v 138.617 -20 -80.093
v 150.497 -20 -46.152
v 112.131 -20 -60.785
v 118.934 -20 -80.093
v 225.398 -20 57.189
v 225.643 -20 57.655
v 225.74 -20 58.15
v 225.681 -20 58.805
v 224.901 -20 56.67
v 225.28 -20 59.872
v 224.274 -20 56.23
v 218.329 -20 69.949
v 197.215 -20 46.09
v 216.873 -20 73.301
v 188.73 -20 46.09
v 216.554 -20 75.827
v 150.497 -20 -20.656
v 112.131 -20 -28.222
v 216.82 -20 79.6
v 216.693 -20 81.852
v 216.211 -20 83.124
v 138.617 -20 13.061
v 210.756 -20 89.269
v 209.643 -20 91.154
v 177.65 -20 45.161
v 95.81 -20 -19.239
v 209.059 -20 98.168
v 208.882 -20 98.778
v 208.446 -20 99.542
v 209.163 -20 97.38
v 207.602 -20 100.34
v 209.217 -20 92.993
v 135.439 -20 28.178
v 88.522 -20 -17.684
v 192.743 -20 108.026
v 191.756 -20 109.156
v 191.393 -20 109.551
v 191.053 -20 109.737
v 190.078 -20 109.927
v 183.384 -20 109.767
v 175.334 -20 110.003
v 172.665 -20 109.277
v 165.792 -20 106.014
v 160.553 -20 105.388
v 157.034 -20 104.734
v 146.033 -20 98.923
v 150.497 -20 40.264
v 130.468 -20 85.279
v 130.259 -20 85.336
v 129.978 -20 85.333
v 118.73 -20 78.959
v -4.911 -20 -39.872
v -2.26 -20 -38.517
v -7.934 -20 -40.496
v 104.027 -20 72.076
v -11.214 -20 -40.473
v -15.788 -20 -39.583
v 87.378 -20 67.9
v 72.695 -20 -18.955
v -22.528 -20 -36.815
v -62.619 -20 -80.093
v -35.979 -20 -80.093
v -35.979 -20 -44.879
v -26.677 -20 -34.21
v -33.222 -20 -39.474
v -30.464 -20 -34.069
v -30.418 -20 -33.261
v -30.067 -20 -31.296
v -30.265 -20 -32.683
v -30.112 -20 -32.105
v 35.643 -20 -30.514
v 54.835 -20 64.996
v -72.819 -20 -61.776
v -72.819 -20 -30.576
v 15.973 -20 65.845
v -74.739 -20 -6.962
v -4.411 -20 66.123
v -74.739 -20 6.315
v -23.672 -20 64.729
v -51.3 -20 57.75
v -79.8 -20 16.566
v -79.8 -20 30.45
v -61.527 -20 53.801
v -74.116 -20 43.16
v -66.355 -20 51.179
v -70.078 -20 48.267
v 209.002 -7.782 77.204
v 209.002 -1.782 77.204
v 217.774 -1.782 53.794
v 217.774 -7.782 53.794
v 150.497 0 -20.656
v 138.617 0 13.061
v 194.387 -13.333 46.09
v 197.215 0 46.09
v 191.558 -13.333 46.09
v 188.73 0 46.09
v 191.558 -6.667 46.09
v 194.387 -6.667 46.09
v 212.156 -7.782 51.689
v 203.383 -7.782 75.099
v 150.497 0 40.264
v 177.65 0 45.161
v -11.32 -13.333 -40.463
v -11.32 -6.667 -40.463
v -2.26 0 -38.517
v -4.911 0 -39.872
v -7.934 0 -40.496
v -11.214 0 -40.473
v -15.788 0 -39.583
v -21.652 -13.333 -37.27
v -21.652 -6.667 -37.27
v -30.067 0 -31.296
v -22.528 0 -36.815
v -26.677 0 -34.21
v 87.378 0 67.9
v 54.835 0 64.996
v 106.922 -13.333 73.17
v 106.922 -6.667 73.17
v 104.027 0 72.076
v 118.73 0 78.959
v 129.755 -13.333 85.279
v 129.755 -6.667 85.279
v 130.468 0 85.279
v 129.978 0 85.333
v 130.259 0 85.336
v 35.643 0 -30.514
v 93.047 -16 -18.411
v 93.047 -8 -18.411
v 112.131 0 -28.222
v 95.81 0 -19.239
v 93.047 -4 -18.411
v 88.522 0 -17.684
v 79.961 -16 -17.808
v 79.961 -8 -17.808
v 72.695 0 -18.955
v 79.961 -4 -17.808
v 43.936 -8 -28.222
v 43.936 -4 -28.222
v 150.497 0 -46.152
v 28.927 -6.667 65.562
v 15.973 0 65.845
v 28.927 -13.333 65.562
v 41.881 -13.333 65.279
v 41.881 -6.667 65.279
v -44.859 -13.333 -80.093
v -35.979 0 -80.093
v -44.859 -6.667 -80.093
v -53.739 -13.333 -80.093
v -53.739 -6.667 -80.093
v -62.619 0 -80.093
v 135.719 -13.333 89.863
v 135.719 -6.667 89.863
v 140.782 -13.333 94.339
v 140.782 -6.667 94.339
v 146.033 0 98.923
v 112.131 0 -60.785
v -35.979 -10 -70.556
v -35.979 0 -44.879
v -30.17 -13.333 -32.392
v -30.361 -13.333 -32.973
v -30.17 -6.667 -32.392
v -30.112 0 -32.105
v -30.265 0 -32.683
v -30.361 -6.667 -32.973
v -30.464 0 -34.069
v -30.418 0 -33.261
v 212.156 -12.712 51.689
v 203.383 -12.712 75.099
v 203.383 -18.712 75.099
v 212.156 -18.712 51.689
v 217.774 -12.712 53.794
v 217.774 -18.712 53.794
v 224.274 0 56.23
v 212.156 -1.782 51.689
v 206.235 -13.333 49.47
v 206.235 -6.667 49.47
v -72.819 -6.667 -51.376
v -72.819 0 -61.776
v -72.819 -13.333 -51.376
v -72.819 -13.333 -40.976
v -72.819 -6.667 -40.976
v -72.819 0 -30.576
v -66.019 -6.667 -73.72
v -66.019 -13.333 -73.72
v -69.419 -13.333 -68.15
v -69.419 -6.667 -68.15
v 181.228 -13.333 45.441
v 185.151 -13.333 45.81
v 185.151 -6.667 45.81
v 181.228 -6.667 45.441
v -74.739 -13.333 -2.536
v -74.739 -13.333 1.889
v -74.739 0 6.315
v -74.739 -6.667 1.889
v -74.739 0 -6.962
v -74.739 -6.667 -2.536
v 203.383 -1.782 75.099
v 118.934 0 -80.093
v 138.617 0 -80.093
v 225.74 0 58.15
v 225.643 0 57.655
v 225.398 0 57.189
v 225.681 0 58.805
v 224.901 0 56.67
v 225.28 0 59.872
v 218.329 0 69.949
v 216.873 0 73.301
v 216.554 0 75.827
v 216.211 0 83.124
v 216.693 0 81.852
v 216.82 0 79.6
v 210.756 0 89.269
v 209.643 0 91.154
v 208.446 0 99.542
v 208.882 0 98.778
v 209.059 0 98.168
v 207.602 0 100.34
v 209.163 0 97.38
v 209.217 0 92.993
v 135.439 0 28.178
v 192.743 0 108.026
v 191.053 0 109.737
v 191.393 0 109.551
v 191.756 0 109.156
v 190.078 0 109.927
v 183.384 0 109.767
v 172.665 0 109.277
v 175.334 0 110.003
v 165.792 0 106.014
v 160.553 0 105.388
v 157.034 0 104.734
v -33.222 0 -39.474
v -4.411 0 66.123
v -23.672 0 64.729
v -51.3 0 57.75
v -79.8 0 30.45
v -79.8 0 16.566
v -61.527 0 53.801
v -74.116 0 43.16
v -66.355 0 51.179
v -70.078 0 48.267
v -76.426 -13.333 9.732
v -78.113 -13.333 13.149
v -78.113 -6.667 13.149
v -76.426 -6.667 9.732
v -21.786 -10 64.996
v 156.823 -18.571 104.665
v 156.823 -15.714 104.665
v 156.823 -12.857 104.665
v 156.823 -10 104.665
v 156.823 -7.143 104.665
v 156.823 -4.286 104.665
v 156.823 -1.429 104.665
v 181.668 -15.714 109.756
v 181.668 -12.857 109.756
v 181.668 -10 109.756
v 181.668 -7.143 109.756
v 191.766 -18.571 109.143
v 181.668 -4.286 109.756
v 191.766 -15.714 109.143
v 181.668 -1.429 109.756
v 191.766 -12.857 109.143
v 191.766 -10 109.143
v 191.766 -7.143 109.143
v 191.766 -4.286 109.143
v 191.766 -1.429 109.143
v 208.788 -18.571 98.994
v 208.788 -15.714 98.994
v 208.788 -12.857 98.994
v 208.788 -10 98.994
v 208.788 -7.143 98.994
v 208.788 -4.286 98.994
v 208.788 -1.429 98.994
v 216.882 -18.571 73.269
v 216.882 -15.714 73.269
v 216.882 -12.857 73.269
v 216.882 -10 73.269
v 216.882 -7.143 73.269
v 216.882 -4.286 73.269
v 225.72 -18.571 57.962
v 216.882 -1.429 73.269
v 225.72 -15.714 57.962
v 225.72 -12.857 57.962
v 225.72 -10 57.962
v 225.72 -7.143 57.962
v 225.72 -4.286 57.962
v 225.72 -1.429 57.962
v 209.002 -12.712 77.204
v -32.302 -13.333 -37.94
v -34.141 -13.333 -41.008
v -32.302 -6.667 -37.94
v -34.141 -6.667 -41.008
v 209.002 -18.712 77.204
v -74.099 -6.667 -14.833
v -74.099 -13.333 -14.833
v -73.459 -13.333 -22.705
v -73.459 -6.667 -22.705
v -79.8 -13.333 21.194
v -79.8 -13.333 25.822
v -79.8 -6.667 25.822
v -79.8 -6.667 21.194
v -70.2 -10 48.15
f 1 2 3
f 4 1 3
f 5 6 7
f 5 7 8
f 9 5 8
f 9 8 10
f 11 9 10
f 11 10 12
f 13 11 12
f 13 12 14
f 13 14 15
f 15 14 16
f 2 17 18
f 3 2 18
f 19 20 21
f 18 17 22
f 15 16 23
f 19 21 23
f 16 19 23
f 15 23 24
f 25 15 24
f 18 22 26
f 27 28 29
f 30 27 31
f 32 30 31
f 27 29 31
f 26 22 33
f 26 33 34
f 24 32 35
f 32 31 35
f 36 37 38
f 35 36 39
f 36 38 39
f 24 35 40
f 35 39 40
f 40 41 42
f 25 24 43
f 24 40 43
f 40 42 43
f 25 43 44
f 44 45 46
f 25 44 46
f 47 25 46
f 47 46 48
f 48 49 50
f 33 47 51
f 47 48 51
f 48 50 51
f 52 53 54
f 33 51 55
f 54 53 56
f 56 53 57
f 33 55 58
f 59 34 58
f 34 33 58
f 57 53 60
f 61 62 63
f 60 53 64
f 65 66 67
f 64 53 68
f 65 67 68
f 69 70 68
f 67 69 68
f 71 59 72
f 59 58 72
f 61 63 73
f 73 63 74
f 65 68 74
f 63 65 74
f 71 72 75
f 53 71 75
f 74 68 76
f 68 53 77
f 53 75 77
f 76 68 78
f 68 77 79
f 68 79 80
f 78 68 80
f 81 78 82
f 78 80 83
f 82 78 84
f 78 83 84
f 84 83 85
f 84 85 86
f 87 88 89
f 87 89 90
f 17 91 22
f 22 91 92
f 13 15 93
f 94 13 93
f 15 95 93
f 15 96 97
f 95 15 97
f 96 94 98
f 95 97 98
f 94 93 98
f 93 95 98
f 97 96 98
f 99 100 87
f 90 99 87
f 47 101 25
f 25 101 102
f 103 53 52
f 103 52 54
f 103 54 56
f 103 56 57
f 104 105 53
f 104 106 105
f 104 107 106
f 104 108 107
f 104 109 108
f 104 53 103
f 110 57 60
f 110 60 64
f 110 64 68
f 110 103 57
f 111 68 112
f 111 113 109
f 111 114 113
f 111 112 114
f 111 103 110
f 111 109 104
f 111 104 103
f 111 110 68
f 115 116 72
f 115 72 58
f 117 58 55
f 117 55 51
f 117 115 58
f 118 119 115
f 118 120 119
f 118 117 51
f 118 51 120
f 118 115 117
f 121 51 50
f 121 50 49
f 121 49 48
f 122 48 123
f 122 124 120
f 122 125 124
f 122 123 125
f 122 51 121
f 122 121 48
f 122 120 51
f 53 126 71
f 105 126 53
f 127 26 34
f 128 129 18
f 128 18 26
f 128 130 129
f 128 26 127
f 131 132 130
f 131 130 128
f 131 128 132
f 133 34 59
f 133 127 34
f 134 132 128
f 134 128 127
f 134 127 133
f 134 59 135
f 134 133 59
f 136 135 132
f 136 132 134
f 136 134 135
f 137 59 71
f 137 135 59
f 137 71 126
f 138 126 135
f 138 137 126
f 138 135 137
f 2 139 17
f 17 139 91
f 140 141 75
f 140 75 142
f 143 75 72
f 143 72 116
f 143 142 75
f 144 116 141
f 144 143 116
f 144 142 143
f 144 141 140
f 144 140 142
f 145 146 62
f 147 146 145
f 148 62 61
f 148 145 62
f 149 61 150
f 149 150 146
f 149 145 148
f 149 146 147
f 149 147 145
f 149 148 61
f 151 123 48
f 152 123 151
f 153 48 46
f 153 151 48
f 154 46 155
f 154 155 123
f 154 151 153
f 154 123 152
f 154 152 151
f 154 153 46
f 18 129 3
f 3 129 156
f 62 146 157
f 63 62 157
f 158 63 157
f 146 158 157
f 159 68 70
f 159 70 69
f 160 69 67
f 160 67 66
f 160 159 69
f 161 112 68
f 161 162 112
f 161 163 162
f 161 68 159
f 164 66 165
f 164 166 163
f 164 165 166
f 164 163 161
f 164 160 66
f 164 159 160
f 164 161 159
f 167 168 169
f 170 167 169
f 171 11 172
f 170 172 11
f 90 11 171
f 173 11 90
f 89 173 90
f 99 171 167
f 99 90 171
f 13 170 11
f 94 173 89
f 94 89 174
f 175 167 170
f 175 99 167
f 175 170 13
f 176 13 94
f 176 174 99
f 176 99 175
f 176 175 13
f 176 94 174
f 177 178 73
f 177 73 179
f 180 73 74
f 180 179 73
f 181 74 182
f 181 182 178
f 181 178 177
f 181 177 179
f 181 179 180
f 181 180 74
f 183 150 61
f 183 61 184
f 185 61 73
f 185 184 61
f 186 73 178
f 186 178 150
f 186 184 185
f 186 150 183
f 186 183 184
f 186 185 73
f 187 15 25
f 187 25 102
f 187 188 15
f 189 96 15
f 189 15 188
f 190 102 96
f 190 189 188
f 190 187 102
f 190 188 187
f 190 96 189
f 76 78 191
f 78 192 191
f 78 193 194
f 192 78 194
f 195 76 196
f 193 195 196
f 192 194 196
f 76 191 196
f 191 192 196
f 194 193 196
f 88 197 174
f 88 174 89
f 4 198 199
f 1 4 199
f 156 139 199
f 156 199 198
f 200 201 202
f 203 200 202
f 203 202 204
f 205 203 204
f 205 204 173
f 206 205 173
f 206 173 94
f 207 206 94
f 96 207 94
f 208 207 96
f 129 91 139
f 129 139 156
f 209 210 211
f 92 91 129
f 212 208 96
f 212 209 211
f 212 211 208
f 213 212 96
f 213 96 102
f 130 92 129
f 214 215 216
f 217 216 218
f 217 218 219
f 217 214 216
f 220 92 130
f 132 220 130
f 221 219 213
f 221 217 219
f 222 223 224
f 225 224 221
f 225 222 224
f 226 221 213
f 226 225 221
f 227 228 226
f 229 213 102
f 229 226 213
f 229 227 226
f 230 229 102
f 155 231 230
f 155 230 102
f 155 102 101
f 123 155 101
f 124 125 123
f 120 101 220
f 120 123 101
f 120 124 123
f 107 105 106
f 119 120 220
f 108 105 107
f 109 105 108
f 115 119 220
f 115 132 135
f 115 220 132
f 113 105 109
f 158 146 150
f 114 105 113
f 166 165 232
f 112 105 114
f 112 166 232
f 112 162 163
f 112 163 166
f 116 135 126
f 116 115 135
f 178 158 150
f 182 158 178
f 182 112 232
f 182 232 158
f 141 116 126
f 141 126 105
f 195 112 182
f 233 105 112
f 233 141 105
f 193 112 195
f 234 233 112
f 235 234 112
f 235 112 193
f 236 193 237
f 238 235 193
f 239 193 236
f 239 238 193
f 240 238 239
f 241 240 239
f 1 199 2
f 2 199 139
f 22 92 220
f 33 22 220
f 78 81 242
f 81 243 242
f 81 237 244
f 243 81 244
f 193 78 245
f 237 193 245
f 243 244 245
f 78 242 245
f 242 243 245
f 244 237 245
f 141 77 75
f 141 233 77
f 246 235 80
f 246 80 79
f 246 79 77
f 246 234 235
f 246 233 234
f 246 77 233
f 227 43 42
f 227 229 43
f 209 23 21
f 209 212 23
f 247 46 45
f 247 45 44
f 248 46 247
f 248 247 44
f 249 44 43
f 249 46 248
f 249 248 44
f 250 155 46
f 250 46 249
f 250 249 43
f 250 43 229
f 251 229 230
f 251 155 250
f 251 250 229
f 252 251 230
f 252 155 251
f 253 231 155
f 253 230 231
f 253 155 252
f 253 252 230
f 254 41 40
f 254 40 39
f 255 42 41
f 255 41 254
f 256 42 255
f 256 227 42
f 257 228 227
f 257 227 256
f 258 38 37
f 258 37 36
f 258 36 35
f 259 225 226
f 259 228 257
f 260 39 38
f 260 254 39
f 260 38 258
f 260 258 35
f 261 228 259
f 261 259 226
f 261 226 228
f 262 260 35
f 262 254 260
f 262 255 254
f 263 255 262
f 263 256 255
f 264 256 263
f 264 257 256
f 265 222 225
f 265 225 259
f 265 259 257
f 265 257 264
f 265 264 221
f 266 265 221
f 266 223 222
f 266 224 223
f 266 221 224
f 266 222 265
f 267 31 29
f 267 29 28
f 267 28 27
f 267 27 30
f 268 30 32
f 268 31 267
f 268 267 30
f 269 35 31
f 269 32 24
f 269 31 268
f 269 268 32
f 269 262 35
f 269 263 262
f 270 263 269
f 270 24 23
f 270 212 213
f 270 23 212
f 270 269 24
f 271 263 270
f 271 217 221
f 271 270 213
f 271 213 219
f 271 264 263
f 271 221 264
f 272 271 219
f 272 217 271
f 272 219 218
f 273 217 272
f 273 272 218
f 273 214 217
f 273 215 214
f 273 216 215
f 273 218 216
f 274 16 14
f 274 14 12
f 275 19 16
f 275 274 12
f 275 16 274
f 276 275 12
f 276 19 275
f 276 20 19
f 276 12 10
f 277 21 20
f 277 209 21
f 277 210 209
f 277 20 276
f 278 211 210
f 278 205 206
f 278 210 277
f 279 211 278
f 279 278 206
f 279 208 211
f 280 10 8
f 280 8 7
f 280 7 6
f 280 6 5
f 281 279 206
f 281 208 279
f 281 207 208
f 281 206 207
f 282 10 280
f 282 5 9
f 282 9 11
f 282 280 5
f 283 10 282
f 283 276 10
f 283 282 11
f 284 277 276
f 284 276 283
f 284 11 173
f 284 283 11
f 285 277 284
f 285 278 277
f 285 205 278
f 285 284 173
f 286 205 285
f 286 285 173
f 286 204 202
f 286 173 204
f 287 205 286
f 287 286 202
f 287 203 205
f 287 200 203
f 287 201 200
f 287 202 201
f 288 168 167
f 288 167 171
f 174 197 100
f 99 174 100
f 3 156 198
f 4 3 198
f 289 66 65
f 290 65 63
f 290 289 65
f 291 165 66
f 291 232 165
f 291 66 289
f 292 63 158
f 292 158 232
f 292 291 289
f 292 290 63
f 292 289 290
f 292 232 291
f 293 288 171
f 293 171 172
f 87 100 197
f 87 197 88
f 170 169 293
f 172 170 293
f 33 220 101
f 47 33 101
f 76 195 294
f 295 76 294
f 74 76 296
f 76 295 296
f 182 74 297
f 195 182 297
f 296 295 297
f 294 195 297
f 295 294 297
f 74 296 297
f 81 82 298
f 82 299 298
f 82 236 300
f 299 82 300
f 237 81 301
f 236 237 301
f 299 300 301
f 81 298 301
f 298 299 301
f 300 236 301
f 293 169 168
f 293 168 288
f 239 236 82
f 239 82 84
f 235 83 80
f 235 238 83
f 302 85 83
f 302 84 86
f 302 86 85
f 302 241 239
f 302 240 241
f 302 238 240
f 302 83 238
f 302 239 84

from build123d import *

# Parameters (mm, degrees)
F1_DEPTH = 20
F2_W     = 6
F2_H     = 6
F3_DEPTH = 25


with BuildPart() as f1:
    # F0 (on Front) → F1 (new body)
    with BuildSketch(Plane.XZ):
        with BuildLine():
            add(Edge.make_bspline(
                [(-79.8000022769, 30.4499994963), (-77.3255732356, 37.0363681068), (-72.3122665902, 50.380652777), (-58.3638603742, 55.2725916691), (-51.3000003994, 57.750005275)],
                knots=[0, 0, 0, 0, 0.4935722501, 1, 1, 1, 1], degree=3))
            add(Edge.make_bspline(
                [(-79.8000022769, 30.4499994963), (-79.8000022769, 25.8219769845), (-79.8000022769, 21.1939544727), (-79.8000022769, 16.5659319609)],
                knots=[0, 0, 0, 0, 13.8840675354, 13.8840675354, 13.8840675354, 13.8840675354], degree=3))
            add(Edge.make_bspline(
                [(-79.8000022769, 16.5659319609), (-78.1129176418, 13.1488006252), (-76.4258330067, 9.7316692894), (-74.7387483716, 6.3145379536)],
                knots=[0, 0, 0, 0, 11.4327324025, 11.4327324025, 11.4327324025, 11.4327324025], degree=3))
            add(Edge.make_bspline(
                [(-74.7387483716, 6.3145379536), (-74.7387483716, 1.8891720101), (-74.7387483716, -2.5361939333), (-74.7387483716, -6.9615598768)],
                knots=[0, 0, 0, 0, 13.2760978304, 13.2760978304, 13.2760978304, 13.2760978304], degree=3))
            add(Edge.make_bspline(
                [(-74.7387483716, -6.9615598768), (-74.0988701582, -14.8331653327), (-73.4589919448, -22.7047707886), (-72.8191137314, -30.5763762444)],
                knots=[0, 0, 0, 0, 23.6927108881, 23.6927108881, 23.6927108881, 23.6927108881], degree=3))
            add(Edge.make_bspline(
                [(-72.8191137314, -61.776380986), (-72.8191137314, -51.3763794055), (-72.8191137314, -40.9763778249), (-72.8191137314, -30.5763762444)],
                knots=[0, 0, 0, 0, 31.2000047415, 31.2000047415, 31.2000047415, 31.2000047415], degree=3))
            add(Edge.make_bspline(
                [(-62.619112432, -80.093100667), (-66.0191128651, -72.7824432154), (-69.4191132983, -69.0870384375), (-72.8191137314, -61.776380986)],
                knots=[0, 0, 0, 0, 20.9652628503, 20.9652628503, 20.9652628503, 20.9652628503], degree=3))
            add(Edge.make_bspline(
                [(-35.9794348478, -80.093100667), (-44.8593273759, -80.093100667), (-53.7392199039, -80.093100667), (-62.619112432, -80.093100667)],
                knots=[0, 0, 0, 0, 26.6396775842, 26.6396775842, 26.6396775842, 26.6396775842], degree=3))
            add(Edge.make_bspline(
                [(-35.9794348478, -70.5561637878), (-35.9794348478, -74.9402269721), (-35.9794348478, -75.7090374827), (-35.9794348478, -80.093100667)],
                knots=[0, 0, 0, 0, 9.5369368792, 9.5369368792, 9.5369368792, 9.5369368792], degree=3))
            add(Edge.make_bspline(
                [(-35.9794348478, -70.5561637878), (-35.9794348478, -68.7853942315), (-35.9794348478, -67.0146246751), (-35.9794348478, -65.2438551188)],
                knots=[0, 0, 0, 0, 5.3123086691, 5.3123086691, 5.3123086691, 5.3123086691], degree=3))
            add(Edge.make_bspline(
                [(-35.9794348478, -44.8791794479), (-35.9794348478, -51.6674046715), (-35.9794348478, -58.4556298951), (-35.9794348478, -65.2438551188)],
                knots=[0, 0, 0, 0, 20.3646756709, 20.3646756709, 20.3646756709, 20.3646756709], degree=3))
            add(Edge.make_bspline(
                [(-30.4639991373, -34.0694524348), (-32.3024777075, -38.877778997), (-34.1409562776, -40.0708528856), (-35.9794348478, -44.8791794479)],
                knots=[0, 0, 0, 0, 12.1354945995, 12.1354945995, 12.1354945995, 12.1354945995], degree=3))
            add(Edge.make_bspline(
                [(-30.0665453109, -31.2956437094), (-30.0665453109, -32.9927003257), (-30.4639991373, -32.3723958184), (-30.4639991373, -34.0694524348)],
                knots=[0, 0, 0, 0, 2.8021392523, 2.8021392523, 2.8021392523, 2.8021392523], degree=3))
            add(Edge.make_bspline(
                [(-2.2595758461, -38.5172505659), (-9.6200771127, -43.818919345), (-23.6749724779, -37.8736013329), (-30.0665453109, -31.2956437094)],
                knots=[0, 0, 0, 0, 28.7294127404, 28.7294127404, 28.7294127404, 28.7294127404], degree=3))
            add(Edge.make_bspline(
                [(112.1307405169, -28.2221909259), (105.8817951046, -24.7501724659), (93.9445246715, -15.0327857291), (65.6693160397, -19.5559154849), (44.3976752626, -28.9456919948), (21.6065692925, -33.5118881504), (6.2228508317, -37.1349119471), (-2.2595758461, -38.5172505659)],
                knots=[0, 0, 0, 0, 0.1898170247, 0.4016605517, 0.601369808, 0.7966678874, 1, 1, 1, 1], degree=3))
            Line((112.1307405169, -28.2221909259), (112.1307405169, -60.7847019593))
            Line((112.1307405169, -60.7847019593), (118.9336627722, -80.093100667))
            Line((118.9336627722, -80.093100667), (138.6172473431, -80.093100667))
            Line((138.6172473431, -80.093100667), (150.4966318607, -46.1519733071))
            Line((150.4966318607, -46.1519733071), (150.4966318607, -20.6556878984))
            Line((150.4966318607, -20.6556878984), (138.6172473431, 13.0609832704))
            Line((138.6172473431, 13.0609832704), (135.4389489575, 28.1778269822))
            Line((135.4389489575, 28.1778269822), (150.4966318607, 40.2639172971))
            Line((150.4966318607, 40.2639172971), (177.6495277882, 45.1609827578))
            add(Edge.make_bspline(
                [(188.7300014496, 46.0898764431), (185.5520208677, 45.9128059447), (180.8275083701, 45.3380532563), (177.6495277882, 45.1609827578)],
                knots=[0, 0, 0, 0, 11.1193408096, 11.1193408096, 11.1193408096, 11.1193408096], degree=3))
            add(Edge.make_bspline(
                [(188.7300014496, 46.0898764431), (191.5584305922, 46.0898764431), (194.3868597349, 46.0898764431), (197.2152888775, 46.0898764431)],
                knots=[0, 0, 0, 0, 8.4852874279, 8.4852874279, 8.4852874279, 8.4852874279], degree=3))
            add(Edge.make_bspline(
                [(224.2738649775, 56.229789657), (215.2543396108, 52.8498185857), (206.2348142442, 49.4698475144), (197.2152888775, 46.0898764431)],
                knots=[0.0497350992, 0.0497350992, 0.0497350992, 0.0497350992, 28.9458313848, 28.9458313848, 28.9458313848, 28.9458313848], degree=3))
            add(Edge.make_bspline(
                [(146.0334894754, 98.9233508118), (150.3940280286, 101.6135872187), (157.9225497869, 106.2583124234), (165.5975371709, 104.7325906898), (174.1006372739, 111.0852743921), (180.9905790948, 109.1540917701), (191.4851006845, 110.5326477527), (191.9080991824, 108.005267024), (201.4835317513, 102.3803882418), (210.8501414622, 100.2528226665), (207.2585729408, 90.020248633), (219.3113885554, 83.2050270338), (213.7502656166, 72.9377152539), (226.2577816693, 60.4026103396), (225.7201837949, 57.2466550282), (224.7031647173, 56.4961008047), (224.2738649775, 56.229789657)],
                knots=[0, 0, 0, 0, 0.0951185118, 0.1642232437, 0.2424448882, 0.3133091343, 0.3916524715, 0.4260565471, 0.5104908627, 0.5842306953, 0.6562179328, 0.7407490819, 0.819132886, 0.9217378227, 0.9626513343, 0.9882925364, 0.9882925364, 0.9882925364, 0.9882925364], degree=3))
            add(Edge.make_bspline(
                [(130.4682791233, 85.2789804339), (135.9386344751, 89.9880031745), (140.5631341236, 94.2143280713), (146.0334894754, 98.9233508118)],
                knots=[0, 0, 0, 0, 20.6989037466, 20.6989037466, 20.6989037466, 20.6989037466], degree=3))
            add(Edge.make_bspline(
                [(54.8347085714, 64.9961903691), (73.0704797731, 65.9427215527), (104.0737196953, 67.5519506363), (129.1070540483, 85.7448160837), (130.2985168803, 85.3370761201), (130.4682791233, 85.2789804339)],
                knots=[0, 0, 0, 0, 0.5505198563, 0.9359570812, 1, 1, 1, 1], degree=3))
            add(Edge.make_bspline(
                [(15.9734673798, 65.8447146416), (28.9272144437, 65.5618732174), (41.8809615076, 65.2790317933), (54.8347085714, 64.9961903691)],
                knots=[0, 0, 0, 0, 38.8705037322, 38.8705037322, 38.8705037322, 38.8705037322], degree=3))
            add(Edge.make_bspline(
                [(-51.3000003994, 57.750005275), (-41.8053822057, 60.6764830515), (-21.7261098266, 66.865414843), (2.9602289471, 66.1970426005), (15.9734673798, 65.8447146416)],
                knots=[0, 0, 0, 0, 0.472856686, 1, 1, 1, 1], degree=3))
        make_face()
    extrude(amount=F1_DEPTH)

    # F2 (on face) → F3 (cut)
    with BuildSketch(Plane(origin=(9.1396874403, 0, -24.38945215), x_dir=(0.9364093971, 0, 0.3509094486), z_dir=(0.3509094486, 0, -0.9364093971))):
        with Locations((219.8027890972, 15.7118978727)):
            Rectangle(F2_W, F2_H)
        with Locations((219.8027890972, 4.7817049884)):
            Rectangle(F2_W, F2_H)
    extrude(amount=-F3_DEPTH, mode=Mode.SUBTRACT)


solid = f1.part
